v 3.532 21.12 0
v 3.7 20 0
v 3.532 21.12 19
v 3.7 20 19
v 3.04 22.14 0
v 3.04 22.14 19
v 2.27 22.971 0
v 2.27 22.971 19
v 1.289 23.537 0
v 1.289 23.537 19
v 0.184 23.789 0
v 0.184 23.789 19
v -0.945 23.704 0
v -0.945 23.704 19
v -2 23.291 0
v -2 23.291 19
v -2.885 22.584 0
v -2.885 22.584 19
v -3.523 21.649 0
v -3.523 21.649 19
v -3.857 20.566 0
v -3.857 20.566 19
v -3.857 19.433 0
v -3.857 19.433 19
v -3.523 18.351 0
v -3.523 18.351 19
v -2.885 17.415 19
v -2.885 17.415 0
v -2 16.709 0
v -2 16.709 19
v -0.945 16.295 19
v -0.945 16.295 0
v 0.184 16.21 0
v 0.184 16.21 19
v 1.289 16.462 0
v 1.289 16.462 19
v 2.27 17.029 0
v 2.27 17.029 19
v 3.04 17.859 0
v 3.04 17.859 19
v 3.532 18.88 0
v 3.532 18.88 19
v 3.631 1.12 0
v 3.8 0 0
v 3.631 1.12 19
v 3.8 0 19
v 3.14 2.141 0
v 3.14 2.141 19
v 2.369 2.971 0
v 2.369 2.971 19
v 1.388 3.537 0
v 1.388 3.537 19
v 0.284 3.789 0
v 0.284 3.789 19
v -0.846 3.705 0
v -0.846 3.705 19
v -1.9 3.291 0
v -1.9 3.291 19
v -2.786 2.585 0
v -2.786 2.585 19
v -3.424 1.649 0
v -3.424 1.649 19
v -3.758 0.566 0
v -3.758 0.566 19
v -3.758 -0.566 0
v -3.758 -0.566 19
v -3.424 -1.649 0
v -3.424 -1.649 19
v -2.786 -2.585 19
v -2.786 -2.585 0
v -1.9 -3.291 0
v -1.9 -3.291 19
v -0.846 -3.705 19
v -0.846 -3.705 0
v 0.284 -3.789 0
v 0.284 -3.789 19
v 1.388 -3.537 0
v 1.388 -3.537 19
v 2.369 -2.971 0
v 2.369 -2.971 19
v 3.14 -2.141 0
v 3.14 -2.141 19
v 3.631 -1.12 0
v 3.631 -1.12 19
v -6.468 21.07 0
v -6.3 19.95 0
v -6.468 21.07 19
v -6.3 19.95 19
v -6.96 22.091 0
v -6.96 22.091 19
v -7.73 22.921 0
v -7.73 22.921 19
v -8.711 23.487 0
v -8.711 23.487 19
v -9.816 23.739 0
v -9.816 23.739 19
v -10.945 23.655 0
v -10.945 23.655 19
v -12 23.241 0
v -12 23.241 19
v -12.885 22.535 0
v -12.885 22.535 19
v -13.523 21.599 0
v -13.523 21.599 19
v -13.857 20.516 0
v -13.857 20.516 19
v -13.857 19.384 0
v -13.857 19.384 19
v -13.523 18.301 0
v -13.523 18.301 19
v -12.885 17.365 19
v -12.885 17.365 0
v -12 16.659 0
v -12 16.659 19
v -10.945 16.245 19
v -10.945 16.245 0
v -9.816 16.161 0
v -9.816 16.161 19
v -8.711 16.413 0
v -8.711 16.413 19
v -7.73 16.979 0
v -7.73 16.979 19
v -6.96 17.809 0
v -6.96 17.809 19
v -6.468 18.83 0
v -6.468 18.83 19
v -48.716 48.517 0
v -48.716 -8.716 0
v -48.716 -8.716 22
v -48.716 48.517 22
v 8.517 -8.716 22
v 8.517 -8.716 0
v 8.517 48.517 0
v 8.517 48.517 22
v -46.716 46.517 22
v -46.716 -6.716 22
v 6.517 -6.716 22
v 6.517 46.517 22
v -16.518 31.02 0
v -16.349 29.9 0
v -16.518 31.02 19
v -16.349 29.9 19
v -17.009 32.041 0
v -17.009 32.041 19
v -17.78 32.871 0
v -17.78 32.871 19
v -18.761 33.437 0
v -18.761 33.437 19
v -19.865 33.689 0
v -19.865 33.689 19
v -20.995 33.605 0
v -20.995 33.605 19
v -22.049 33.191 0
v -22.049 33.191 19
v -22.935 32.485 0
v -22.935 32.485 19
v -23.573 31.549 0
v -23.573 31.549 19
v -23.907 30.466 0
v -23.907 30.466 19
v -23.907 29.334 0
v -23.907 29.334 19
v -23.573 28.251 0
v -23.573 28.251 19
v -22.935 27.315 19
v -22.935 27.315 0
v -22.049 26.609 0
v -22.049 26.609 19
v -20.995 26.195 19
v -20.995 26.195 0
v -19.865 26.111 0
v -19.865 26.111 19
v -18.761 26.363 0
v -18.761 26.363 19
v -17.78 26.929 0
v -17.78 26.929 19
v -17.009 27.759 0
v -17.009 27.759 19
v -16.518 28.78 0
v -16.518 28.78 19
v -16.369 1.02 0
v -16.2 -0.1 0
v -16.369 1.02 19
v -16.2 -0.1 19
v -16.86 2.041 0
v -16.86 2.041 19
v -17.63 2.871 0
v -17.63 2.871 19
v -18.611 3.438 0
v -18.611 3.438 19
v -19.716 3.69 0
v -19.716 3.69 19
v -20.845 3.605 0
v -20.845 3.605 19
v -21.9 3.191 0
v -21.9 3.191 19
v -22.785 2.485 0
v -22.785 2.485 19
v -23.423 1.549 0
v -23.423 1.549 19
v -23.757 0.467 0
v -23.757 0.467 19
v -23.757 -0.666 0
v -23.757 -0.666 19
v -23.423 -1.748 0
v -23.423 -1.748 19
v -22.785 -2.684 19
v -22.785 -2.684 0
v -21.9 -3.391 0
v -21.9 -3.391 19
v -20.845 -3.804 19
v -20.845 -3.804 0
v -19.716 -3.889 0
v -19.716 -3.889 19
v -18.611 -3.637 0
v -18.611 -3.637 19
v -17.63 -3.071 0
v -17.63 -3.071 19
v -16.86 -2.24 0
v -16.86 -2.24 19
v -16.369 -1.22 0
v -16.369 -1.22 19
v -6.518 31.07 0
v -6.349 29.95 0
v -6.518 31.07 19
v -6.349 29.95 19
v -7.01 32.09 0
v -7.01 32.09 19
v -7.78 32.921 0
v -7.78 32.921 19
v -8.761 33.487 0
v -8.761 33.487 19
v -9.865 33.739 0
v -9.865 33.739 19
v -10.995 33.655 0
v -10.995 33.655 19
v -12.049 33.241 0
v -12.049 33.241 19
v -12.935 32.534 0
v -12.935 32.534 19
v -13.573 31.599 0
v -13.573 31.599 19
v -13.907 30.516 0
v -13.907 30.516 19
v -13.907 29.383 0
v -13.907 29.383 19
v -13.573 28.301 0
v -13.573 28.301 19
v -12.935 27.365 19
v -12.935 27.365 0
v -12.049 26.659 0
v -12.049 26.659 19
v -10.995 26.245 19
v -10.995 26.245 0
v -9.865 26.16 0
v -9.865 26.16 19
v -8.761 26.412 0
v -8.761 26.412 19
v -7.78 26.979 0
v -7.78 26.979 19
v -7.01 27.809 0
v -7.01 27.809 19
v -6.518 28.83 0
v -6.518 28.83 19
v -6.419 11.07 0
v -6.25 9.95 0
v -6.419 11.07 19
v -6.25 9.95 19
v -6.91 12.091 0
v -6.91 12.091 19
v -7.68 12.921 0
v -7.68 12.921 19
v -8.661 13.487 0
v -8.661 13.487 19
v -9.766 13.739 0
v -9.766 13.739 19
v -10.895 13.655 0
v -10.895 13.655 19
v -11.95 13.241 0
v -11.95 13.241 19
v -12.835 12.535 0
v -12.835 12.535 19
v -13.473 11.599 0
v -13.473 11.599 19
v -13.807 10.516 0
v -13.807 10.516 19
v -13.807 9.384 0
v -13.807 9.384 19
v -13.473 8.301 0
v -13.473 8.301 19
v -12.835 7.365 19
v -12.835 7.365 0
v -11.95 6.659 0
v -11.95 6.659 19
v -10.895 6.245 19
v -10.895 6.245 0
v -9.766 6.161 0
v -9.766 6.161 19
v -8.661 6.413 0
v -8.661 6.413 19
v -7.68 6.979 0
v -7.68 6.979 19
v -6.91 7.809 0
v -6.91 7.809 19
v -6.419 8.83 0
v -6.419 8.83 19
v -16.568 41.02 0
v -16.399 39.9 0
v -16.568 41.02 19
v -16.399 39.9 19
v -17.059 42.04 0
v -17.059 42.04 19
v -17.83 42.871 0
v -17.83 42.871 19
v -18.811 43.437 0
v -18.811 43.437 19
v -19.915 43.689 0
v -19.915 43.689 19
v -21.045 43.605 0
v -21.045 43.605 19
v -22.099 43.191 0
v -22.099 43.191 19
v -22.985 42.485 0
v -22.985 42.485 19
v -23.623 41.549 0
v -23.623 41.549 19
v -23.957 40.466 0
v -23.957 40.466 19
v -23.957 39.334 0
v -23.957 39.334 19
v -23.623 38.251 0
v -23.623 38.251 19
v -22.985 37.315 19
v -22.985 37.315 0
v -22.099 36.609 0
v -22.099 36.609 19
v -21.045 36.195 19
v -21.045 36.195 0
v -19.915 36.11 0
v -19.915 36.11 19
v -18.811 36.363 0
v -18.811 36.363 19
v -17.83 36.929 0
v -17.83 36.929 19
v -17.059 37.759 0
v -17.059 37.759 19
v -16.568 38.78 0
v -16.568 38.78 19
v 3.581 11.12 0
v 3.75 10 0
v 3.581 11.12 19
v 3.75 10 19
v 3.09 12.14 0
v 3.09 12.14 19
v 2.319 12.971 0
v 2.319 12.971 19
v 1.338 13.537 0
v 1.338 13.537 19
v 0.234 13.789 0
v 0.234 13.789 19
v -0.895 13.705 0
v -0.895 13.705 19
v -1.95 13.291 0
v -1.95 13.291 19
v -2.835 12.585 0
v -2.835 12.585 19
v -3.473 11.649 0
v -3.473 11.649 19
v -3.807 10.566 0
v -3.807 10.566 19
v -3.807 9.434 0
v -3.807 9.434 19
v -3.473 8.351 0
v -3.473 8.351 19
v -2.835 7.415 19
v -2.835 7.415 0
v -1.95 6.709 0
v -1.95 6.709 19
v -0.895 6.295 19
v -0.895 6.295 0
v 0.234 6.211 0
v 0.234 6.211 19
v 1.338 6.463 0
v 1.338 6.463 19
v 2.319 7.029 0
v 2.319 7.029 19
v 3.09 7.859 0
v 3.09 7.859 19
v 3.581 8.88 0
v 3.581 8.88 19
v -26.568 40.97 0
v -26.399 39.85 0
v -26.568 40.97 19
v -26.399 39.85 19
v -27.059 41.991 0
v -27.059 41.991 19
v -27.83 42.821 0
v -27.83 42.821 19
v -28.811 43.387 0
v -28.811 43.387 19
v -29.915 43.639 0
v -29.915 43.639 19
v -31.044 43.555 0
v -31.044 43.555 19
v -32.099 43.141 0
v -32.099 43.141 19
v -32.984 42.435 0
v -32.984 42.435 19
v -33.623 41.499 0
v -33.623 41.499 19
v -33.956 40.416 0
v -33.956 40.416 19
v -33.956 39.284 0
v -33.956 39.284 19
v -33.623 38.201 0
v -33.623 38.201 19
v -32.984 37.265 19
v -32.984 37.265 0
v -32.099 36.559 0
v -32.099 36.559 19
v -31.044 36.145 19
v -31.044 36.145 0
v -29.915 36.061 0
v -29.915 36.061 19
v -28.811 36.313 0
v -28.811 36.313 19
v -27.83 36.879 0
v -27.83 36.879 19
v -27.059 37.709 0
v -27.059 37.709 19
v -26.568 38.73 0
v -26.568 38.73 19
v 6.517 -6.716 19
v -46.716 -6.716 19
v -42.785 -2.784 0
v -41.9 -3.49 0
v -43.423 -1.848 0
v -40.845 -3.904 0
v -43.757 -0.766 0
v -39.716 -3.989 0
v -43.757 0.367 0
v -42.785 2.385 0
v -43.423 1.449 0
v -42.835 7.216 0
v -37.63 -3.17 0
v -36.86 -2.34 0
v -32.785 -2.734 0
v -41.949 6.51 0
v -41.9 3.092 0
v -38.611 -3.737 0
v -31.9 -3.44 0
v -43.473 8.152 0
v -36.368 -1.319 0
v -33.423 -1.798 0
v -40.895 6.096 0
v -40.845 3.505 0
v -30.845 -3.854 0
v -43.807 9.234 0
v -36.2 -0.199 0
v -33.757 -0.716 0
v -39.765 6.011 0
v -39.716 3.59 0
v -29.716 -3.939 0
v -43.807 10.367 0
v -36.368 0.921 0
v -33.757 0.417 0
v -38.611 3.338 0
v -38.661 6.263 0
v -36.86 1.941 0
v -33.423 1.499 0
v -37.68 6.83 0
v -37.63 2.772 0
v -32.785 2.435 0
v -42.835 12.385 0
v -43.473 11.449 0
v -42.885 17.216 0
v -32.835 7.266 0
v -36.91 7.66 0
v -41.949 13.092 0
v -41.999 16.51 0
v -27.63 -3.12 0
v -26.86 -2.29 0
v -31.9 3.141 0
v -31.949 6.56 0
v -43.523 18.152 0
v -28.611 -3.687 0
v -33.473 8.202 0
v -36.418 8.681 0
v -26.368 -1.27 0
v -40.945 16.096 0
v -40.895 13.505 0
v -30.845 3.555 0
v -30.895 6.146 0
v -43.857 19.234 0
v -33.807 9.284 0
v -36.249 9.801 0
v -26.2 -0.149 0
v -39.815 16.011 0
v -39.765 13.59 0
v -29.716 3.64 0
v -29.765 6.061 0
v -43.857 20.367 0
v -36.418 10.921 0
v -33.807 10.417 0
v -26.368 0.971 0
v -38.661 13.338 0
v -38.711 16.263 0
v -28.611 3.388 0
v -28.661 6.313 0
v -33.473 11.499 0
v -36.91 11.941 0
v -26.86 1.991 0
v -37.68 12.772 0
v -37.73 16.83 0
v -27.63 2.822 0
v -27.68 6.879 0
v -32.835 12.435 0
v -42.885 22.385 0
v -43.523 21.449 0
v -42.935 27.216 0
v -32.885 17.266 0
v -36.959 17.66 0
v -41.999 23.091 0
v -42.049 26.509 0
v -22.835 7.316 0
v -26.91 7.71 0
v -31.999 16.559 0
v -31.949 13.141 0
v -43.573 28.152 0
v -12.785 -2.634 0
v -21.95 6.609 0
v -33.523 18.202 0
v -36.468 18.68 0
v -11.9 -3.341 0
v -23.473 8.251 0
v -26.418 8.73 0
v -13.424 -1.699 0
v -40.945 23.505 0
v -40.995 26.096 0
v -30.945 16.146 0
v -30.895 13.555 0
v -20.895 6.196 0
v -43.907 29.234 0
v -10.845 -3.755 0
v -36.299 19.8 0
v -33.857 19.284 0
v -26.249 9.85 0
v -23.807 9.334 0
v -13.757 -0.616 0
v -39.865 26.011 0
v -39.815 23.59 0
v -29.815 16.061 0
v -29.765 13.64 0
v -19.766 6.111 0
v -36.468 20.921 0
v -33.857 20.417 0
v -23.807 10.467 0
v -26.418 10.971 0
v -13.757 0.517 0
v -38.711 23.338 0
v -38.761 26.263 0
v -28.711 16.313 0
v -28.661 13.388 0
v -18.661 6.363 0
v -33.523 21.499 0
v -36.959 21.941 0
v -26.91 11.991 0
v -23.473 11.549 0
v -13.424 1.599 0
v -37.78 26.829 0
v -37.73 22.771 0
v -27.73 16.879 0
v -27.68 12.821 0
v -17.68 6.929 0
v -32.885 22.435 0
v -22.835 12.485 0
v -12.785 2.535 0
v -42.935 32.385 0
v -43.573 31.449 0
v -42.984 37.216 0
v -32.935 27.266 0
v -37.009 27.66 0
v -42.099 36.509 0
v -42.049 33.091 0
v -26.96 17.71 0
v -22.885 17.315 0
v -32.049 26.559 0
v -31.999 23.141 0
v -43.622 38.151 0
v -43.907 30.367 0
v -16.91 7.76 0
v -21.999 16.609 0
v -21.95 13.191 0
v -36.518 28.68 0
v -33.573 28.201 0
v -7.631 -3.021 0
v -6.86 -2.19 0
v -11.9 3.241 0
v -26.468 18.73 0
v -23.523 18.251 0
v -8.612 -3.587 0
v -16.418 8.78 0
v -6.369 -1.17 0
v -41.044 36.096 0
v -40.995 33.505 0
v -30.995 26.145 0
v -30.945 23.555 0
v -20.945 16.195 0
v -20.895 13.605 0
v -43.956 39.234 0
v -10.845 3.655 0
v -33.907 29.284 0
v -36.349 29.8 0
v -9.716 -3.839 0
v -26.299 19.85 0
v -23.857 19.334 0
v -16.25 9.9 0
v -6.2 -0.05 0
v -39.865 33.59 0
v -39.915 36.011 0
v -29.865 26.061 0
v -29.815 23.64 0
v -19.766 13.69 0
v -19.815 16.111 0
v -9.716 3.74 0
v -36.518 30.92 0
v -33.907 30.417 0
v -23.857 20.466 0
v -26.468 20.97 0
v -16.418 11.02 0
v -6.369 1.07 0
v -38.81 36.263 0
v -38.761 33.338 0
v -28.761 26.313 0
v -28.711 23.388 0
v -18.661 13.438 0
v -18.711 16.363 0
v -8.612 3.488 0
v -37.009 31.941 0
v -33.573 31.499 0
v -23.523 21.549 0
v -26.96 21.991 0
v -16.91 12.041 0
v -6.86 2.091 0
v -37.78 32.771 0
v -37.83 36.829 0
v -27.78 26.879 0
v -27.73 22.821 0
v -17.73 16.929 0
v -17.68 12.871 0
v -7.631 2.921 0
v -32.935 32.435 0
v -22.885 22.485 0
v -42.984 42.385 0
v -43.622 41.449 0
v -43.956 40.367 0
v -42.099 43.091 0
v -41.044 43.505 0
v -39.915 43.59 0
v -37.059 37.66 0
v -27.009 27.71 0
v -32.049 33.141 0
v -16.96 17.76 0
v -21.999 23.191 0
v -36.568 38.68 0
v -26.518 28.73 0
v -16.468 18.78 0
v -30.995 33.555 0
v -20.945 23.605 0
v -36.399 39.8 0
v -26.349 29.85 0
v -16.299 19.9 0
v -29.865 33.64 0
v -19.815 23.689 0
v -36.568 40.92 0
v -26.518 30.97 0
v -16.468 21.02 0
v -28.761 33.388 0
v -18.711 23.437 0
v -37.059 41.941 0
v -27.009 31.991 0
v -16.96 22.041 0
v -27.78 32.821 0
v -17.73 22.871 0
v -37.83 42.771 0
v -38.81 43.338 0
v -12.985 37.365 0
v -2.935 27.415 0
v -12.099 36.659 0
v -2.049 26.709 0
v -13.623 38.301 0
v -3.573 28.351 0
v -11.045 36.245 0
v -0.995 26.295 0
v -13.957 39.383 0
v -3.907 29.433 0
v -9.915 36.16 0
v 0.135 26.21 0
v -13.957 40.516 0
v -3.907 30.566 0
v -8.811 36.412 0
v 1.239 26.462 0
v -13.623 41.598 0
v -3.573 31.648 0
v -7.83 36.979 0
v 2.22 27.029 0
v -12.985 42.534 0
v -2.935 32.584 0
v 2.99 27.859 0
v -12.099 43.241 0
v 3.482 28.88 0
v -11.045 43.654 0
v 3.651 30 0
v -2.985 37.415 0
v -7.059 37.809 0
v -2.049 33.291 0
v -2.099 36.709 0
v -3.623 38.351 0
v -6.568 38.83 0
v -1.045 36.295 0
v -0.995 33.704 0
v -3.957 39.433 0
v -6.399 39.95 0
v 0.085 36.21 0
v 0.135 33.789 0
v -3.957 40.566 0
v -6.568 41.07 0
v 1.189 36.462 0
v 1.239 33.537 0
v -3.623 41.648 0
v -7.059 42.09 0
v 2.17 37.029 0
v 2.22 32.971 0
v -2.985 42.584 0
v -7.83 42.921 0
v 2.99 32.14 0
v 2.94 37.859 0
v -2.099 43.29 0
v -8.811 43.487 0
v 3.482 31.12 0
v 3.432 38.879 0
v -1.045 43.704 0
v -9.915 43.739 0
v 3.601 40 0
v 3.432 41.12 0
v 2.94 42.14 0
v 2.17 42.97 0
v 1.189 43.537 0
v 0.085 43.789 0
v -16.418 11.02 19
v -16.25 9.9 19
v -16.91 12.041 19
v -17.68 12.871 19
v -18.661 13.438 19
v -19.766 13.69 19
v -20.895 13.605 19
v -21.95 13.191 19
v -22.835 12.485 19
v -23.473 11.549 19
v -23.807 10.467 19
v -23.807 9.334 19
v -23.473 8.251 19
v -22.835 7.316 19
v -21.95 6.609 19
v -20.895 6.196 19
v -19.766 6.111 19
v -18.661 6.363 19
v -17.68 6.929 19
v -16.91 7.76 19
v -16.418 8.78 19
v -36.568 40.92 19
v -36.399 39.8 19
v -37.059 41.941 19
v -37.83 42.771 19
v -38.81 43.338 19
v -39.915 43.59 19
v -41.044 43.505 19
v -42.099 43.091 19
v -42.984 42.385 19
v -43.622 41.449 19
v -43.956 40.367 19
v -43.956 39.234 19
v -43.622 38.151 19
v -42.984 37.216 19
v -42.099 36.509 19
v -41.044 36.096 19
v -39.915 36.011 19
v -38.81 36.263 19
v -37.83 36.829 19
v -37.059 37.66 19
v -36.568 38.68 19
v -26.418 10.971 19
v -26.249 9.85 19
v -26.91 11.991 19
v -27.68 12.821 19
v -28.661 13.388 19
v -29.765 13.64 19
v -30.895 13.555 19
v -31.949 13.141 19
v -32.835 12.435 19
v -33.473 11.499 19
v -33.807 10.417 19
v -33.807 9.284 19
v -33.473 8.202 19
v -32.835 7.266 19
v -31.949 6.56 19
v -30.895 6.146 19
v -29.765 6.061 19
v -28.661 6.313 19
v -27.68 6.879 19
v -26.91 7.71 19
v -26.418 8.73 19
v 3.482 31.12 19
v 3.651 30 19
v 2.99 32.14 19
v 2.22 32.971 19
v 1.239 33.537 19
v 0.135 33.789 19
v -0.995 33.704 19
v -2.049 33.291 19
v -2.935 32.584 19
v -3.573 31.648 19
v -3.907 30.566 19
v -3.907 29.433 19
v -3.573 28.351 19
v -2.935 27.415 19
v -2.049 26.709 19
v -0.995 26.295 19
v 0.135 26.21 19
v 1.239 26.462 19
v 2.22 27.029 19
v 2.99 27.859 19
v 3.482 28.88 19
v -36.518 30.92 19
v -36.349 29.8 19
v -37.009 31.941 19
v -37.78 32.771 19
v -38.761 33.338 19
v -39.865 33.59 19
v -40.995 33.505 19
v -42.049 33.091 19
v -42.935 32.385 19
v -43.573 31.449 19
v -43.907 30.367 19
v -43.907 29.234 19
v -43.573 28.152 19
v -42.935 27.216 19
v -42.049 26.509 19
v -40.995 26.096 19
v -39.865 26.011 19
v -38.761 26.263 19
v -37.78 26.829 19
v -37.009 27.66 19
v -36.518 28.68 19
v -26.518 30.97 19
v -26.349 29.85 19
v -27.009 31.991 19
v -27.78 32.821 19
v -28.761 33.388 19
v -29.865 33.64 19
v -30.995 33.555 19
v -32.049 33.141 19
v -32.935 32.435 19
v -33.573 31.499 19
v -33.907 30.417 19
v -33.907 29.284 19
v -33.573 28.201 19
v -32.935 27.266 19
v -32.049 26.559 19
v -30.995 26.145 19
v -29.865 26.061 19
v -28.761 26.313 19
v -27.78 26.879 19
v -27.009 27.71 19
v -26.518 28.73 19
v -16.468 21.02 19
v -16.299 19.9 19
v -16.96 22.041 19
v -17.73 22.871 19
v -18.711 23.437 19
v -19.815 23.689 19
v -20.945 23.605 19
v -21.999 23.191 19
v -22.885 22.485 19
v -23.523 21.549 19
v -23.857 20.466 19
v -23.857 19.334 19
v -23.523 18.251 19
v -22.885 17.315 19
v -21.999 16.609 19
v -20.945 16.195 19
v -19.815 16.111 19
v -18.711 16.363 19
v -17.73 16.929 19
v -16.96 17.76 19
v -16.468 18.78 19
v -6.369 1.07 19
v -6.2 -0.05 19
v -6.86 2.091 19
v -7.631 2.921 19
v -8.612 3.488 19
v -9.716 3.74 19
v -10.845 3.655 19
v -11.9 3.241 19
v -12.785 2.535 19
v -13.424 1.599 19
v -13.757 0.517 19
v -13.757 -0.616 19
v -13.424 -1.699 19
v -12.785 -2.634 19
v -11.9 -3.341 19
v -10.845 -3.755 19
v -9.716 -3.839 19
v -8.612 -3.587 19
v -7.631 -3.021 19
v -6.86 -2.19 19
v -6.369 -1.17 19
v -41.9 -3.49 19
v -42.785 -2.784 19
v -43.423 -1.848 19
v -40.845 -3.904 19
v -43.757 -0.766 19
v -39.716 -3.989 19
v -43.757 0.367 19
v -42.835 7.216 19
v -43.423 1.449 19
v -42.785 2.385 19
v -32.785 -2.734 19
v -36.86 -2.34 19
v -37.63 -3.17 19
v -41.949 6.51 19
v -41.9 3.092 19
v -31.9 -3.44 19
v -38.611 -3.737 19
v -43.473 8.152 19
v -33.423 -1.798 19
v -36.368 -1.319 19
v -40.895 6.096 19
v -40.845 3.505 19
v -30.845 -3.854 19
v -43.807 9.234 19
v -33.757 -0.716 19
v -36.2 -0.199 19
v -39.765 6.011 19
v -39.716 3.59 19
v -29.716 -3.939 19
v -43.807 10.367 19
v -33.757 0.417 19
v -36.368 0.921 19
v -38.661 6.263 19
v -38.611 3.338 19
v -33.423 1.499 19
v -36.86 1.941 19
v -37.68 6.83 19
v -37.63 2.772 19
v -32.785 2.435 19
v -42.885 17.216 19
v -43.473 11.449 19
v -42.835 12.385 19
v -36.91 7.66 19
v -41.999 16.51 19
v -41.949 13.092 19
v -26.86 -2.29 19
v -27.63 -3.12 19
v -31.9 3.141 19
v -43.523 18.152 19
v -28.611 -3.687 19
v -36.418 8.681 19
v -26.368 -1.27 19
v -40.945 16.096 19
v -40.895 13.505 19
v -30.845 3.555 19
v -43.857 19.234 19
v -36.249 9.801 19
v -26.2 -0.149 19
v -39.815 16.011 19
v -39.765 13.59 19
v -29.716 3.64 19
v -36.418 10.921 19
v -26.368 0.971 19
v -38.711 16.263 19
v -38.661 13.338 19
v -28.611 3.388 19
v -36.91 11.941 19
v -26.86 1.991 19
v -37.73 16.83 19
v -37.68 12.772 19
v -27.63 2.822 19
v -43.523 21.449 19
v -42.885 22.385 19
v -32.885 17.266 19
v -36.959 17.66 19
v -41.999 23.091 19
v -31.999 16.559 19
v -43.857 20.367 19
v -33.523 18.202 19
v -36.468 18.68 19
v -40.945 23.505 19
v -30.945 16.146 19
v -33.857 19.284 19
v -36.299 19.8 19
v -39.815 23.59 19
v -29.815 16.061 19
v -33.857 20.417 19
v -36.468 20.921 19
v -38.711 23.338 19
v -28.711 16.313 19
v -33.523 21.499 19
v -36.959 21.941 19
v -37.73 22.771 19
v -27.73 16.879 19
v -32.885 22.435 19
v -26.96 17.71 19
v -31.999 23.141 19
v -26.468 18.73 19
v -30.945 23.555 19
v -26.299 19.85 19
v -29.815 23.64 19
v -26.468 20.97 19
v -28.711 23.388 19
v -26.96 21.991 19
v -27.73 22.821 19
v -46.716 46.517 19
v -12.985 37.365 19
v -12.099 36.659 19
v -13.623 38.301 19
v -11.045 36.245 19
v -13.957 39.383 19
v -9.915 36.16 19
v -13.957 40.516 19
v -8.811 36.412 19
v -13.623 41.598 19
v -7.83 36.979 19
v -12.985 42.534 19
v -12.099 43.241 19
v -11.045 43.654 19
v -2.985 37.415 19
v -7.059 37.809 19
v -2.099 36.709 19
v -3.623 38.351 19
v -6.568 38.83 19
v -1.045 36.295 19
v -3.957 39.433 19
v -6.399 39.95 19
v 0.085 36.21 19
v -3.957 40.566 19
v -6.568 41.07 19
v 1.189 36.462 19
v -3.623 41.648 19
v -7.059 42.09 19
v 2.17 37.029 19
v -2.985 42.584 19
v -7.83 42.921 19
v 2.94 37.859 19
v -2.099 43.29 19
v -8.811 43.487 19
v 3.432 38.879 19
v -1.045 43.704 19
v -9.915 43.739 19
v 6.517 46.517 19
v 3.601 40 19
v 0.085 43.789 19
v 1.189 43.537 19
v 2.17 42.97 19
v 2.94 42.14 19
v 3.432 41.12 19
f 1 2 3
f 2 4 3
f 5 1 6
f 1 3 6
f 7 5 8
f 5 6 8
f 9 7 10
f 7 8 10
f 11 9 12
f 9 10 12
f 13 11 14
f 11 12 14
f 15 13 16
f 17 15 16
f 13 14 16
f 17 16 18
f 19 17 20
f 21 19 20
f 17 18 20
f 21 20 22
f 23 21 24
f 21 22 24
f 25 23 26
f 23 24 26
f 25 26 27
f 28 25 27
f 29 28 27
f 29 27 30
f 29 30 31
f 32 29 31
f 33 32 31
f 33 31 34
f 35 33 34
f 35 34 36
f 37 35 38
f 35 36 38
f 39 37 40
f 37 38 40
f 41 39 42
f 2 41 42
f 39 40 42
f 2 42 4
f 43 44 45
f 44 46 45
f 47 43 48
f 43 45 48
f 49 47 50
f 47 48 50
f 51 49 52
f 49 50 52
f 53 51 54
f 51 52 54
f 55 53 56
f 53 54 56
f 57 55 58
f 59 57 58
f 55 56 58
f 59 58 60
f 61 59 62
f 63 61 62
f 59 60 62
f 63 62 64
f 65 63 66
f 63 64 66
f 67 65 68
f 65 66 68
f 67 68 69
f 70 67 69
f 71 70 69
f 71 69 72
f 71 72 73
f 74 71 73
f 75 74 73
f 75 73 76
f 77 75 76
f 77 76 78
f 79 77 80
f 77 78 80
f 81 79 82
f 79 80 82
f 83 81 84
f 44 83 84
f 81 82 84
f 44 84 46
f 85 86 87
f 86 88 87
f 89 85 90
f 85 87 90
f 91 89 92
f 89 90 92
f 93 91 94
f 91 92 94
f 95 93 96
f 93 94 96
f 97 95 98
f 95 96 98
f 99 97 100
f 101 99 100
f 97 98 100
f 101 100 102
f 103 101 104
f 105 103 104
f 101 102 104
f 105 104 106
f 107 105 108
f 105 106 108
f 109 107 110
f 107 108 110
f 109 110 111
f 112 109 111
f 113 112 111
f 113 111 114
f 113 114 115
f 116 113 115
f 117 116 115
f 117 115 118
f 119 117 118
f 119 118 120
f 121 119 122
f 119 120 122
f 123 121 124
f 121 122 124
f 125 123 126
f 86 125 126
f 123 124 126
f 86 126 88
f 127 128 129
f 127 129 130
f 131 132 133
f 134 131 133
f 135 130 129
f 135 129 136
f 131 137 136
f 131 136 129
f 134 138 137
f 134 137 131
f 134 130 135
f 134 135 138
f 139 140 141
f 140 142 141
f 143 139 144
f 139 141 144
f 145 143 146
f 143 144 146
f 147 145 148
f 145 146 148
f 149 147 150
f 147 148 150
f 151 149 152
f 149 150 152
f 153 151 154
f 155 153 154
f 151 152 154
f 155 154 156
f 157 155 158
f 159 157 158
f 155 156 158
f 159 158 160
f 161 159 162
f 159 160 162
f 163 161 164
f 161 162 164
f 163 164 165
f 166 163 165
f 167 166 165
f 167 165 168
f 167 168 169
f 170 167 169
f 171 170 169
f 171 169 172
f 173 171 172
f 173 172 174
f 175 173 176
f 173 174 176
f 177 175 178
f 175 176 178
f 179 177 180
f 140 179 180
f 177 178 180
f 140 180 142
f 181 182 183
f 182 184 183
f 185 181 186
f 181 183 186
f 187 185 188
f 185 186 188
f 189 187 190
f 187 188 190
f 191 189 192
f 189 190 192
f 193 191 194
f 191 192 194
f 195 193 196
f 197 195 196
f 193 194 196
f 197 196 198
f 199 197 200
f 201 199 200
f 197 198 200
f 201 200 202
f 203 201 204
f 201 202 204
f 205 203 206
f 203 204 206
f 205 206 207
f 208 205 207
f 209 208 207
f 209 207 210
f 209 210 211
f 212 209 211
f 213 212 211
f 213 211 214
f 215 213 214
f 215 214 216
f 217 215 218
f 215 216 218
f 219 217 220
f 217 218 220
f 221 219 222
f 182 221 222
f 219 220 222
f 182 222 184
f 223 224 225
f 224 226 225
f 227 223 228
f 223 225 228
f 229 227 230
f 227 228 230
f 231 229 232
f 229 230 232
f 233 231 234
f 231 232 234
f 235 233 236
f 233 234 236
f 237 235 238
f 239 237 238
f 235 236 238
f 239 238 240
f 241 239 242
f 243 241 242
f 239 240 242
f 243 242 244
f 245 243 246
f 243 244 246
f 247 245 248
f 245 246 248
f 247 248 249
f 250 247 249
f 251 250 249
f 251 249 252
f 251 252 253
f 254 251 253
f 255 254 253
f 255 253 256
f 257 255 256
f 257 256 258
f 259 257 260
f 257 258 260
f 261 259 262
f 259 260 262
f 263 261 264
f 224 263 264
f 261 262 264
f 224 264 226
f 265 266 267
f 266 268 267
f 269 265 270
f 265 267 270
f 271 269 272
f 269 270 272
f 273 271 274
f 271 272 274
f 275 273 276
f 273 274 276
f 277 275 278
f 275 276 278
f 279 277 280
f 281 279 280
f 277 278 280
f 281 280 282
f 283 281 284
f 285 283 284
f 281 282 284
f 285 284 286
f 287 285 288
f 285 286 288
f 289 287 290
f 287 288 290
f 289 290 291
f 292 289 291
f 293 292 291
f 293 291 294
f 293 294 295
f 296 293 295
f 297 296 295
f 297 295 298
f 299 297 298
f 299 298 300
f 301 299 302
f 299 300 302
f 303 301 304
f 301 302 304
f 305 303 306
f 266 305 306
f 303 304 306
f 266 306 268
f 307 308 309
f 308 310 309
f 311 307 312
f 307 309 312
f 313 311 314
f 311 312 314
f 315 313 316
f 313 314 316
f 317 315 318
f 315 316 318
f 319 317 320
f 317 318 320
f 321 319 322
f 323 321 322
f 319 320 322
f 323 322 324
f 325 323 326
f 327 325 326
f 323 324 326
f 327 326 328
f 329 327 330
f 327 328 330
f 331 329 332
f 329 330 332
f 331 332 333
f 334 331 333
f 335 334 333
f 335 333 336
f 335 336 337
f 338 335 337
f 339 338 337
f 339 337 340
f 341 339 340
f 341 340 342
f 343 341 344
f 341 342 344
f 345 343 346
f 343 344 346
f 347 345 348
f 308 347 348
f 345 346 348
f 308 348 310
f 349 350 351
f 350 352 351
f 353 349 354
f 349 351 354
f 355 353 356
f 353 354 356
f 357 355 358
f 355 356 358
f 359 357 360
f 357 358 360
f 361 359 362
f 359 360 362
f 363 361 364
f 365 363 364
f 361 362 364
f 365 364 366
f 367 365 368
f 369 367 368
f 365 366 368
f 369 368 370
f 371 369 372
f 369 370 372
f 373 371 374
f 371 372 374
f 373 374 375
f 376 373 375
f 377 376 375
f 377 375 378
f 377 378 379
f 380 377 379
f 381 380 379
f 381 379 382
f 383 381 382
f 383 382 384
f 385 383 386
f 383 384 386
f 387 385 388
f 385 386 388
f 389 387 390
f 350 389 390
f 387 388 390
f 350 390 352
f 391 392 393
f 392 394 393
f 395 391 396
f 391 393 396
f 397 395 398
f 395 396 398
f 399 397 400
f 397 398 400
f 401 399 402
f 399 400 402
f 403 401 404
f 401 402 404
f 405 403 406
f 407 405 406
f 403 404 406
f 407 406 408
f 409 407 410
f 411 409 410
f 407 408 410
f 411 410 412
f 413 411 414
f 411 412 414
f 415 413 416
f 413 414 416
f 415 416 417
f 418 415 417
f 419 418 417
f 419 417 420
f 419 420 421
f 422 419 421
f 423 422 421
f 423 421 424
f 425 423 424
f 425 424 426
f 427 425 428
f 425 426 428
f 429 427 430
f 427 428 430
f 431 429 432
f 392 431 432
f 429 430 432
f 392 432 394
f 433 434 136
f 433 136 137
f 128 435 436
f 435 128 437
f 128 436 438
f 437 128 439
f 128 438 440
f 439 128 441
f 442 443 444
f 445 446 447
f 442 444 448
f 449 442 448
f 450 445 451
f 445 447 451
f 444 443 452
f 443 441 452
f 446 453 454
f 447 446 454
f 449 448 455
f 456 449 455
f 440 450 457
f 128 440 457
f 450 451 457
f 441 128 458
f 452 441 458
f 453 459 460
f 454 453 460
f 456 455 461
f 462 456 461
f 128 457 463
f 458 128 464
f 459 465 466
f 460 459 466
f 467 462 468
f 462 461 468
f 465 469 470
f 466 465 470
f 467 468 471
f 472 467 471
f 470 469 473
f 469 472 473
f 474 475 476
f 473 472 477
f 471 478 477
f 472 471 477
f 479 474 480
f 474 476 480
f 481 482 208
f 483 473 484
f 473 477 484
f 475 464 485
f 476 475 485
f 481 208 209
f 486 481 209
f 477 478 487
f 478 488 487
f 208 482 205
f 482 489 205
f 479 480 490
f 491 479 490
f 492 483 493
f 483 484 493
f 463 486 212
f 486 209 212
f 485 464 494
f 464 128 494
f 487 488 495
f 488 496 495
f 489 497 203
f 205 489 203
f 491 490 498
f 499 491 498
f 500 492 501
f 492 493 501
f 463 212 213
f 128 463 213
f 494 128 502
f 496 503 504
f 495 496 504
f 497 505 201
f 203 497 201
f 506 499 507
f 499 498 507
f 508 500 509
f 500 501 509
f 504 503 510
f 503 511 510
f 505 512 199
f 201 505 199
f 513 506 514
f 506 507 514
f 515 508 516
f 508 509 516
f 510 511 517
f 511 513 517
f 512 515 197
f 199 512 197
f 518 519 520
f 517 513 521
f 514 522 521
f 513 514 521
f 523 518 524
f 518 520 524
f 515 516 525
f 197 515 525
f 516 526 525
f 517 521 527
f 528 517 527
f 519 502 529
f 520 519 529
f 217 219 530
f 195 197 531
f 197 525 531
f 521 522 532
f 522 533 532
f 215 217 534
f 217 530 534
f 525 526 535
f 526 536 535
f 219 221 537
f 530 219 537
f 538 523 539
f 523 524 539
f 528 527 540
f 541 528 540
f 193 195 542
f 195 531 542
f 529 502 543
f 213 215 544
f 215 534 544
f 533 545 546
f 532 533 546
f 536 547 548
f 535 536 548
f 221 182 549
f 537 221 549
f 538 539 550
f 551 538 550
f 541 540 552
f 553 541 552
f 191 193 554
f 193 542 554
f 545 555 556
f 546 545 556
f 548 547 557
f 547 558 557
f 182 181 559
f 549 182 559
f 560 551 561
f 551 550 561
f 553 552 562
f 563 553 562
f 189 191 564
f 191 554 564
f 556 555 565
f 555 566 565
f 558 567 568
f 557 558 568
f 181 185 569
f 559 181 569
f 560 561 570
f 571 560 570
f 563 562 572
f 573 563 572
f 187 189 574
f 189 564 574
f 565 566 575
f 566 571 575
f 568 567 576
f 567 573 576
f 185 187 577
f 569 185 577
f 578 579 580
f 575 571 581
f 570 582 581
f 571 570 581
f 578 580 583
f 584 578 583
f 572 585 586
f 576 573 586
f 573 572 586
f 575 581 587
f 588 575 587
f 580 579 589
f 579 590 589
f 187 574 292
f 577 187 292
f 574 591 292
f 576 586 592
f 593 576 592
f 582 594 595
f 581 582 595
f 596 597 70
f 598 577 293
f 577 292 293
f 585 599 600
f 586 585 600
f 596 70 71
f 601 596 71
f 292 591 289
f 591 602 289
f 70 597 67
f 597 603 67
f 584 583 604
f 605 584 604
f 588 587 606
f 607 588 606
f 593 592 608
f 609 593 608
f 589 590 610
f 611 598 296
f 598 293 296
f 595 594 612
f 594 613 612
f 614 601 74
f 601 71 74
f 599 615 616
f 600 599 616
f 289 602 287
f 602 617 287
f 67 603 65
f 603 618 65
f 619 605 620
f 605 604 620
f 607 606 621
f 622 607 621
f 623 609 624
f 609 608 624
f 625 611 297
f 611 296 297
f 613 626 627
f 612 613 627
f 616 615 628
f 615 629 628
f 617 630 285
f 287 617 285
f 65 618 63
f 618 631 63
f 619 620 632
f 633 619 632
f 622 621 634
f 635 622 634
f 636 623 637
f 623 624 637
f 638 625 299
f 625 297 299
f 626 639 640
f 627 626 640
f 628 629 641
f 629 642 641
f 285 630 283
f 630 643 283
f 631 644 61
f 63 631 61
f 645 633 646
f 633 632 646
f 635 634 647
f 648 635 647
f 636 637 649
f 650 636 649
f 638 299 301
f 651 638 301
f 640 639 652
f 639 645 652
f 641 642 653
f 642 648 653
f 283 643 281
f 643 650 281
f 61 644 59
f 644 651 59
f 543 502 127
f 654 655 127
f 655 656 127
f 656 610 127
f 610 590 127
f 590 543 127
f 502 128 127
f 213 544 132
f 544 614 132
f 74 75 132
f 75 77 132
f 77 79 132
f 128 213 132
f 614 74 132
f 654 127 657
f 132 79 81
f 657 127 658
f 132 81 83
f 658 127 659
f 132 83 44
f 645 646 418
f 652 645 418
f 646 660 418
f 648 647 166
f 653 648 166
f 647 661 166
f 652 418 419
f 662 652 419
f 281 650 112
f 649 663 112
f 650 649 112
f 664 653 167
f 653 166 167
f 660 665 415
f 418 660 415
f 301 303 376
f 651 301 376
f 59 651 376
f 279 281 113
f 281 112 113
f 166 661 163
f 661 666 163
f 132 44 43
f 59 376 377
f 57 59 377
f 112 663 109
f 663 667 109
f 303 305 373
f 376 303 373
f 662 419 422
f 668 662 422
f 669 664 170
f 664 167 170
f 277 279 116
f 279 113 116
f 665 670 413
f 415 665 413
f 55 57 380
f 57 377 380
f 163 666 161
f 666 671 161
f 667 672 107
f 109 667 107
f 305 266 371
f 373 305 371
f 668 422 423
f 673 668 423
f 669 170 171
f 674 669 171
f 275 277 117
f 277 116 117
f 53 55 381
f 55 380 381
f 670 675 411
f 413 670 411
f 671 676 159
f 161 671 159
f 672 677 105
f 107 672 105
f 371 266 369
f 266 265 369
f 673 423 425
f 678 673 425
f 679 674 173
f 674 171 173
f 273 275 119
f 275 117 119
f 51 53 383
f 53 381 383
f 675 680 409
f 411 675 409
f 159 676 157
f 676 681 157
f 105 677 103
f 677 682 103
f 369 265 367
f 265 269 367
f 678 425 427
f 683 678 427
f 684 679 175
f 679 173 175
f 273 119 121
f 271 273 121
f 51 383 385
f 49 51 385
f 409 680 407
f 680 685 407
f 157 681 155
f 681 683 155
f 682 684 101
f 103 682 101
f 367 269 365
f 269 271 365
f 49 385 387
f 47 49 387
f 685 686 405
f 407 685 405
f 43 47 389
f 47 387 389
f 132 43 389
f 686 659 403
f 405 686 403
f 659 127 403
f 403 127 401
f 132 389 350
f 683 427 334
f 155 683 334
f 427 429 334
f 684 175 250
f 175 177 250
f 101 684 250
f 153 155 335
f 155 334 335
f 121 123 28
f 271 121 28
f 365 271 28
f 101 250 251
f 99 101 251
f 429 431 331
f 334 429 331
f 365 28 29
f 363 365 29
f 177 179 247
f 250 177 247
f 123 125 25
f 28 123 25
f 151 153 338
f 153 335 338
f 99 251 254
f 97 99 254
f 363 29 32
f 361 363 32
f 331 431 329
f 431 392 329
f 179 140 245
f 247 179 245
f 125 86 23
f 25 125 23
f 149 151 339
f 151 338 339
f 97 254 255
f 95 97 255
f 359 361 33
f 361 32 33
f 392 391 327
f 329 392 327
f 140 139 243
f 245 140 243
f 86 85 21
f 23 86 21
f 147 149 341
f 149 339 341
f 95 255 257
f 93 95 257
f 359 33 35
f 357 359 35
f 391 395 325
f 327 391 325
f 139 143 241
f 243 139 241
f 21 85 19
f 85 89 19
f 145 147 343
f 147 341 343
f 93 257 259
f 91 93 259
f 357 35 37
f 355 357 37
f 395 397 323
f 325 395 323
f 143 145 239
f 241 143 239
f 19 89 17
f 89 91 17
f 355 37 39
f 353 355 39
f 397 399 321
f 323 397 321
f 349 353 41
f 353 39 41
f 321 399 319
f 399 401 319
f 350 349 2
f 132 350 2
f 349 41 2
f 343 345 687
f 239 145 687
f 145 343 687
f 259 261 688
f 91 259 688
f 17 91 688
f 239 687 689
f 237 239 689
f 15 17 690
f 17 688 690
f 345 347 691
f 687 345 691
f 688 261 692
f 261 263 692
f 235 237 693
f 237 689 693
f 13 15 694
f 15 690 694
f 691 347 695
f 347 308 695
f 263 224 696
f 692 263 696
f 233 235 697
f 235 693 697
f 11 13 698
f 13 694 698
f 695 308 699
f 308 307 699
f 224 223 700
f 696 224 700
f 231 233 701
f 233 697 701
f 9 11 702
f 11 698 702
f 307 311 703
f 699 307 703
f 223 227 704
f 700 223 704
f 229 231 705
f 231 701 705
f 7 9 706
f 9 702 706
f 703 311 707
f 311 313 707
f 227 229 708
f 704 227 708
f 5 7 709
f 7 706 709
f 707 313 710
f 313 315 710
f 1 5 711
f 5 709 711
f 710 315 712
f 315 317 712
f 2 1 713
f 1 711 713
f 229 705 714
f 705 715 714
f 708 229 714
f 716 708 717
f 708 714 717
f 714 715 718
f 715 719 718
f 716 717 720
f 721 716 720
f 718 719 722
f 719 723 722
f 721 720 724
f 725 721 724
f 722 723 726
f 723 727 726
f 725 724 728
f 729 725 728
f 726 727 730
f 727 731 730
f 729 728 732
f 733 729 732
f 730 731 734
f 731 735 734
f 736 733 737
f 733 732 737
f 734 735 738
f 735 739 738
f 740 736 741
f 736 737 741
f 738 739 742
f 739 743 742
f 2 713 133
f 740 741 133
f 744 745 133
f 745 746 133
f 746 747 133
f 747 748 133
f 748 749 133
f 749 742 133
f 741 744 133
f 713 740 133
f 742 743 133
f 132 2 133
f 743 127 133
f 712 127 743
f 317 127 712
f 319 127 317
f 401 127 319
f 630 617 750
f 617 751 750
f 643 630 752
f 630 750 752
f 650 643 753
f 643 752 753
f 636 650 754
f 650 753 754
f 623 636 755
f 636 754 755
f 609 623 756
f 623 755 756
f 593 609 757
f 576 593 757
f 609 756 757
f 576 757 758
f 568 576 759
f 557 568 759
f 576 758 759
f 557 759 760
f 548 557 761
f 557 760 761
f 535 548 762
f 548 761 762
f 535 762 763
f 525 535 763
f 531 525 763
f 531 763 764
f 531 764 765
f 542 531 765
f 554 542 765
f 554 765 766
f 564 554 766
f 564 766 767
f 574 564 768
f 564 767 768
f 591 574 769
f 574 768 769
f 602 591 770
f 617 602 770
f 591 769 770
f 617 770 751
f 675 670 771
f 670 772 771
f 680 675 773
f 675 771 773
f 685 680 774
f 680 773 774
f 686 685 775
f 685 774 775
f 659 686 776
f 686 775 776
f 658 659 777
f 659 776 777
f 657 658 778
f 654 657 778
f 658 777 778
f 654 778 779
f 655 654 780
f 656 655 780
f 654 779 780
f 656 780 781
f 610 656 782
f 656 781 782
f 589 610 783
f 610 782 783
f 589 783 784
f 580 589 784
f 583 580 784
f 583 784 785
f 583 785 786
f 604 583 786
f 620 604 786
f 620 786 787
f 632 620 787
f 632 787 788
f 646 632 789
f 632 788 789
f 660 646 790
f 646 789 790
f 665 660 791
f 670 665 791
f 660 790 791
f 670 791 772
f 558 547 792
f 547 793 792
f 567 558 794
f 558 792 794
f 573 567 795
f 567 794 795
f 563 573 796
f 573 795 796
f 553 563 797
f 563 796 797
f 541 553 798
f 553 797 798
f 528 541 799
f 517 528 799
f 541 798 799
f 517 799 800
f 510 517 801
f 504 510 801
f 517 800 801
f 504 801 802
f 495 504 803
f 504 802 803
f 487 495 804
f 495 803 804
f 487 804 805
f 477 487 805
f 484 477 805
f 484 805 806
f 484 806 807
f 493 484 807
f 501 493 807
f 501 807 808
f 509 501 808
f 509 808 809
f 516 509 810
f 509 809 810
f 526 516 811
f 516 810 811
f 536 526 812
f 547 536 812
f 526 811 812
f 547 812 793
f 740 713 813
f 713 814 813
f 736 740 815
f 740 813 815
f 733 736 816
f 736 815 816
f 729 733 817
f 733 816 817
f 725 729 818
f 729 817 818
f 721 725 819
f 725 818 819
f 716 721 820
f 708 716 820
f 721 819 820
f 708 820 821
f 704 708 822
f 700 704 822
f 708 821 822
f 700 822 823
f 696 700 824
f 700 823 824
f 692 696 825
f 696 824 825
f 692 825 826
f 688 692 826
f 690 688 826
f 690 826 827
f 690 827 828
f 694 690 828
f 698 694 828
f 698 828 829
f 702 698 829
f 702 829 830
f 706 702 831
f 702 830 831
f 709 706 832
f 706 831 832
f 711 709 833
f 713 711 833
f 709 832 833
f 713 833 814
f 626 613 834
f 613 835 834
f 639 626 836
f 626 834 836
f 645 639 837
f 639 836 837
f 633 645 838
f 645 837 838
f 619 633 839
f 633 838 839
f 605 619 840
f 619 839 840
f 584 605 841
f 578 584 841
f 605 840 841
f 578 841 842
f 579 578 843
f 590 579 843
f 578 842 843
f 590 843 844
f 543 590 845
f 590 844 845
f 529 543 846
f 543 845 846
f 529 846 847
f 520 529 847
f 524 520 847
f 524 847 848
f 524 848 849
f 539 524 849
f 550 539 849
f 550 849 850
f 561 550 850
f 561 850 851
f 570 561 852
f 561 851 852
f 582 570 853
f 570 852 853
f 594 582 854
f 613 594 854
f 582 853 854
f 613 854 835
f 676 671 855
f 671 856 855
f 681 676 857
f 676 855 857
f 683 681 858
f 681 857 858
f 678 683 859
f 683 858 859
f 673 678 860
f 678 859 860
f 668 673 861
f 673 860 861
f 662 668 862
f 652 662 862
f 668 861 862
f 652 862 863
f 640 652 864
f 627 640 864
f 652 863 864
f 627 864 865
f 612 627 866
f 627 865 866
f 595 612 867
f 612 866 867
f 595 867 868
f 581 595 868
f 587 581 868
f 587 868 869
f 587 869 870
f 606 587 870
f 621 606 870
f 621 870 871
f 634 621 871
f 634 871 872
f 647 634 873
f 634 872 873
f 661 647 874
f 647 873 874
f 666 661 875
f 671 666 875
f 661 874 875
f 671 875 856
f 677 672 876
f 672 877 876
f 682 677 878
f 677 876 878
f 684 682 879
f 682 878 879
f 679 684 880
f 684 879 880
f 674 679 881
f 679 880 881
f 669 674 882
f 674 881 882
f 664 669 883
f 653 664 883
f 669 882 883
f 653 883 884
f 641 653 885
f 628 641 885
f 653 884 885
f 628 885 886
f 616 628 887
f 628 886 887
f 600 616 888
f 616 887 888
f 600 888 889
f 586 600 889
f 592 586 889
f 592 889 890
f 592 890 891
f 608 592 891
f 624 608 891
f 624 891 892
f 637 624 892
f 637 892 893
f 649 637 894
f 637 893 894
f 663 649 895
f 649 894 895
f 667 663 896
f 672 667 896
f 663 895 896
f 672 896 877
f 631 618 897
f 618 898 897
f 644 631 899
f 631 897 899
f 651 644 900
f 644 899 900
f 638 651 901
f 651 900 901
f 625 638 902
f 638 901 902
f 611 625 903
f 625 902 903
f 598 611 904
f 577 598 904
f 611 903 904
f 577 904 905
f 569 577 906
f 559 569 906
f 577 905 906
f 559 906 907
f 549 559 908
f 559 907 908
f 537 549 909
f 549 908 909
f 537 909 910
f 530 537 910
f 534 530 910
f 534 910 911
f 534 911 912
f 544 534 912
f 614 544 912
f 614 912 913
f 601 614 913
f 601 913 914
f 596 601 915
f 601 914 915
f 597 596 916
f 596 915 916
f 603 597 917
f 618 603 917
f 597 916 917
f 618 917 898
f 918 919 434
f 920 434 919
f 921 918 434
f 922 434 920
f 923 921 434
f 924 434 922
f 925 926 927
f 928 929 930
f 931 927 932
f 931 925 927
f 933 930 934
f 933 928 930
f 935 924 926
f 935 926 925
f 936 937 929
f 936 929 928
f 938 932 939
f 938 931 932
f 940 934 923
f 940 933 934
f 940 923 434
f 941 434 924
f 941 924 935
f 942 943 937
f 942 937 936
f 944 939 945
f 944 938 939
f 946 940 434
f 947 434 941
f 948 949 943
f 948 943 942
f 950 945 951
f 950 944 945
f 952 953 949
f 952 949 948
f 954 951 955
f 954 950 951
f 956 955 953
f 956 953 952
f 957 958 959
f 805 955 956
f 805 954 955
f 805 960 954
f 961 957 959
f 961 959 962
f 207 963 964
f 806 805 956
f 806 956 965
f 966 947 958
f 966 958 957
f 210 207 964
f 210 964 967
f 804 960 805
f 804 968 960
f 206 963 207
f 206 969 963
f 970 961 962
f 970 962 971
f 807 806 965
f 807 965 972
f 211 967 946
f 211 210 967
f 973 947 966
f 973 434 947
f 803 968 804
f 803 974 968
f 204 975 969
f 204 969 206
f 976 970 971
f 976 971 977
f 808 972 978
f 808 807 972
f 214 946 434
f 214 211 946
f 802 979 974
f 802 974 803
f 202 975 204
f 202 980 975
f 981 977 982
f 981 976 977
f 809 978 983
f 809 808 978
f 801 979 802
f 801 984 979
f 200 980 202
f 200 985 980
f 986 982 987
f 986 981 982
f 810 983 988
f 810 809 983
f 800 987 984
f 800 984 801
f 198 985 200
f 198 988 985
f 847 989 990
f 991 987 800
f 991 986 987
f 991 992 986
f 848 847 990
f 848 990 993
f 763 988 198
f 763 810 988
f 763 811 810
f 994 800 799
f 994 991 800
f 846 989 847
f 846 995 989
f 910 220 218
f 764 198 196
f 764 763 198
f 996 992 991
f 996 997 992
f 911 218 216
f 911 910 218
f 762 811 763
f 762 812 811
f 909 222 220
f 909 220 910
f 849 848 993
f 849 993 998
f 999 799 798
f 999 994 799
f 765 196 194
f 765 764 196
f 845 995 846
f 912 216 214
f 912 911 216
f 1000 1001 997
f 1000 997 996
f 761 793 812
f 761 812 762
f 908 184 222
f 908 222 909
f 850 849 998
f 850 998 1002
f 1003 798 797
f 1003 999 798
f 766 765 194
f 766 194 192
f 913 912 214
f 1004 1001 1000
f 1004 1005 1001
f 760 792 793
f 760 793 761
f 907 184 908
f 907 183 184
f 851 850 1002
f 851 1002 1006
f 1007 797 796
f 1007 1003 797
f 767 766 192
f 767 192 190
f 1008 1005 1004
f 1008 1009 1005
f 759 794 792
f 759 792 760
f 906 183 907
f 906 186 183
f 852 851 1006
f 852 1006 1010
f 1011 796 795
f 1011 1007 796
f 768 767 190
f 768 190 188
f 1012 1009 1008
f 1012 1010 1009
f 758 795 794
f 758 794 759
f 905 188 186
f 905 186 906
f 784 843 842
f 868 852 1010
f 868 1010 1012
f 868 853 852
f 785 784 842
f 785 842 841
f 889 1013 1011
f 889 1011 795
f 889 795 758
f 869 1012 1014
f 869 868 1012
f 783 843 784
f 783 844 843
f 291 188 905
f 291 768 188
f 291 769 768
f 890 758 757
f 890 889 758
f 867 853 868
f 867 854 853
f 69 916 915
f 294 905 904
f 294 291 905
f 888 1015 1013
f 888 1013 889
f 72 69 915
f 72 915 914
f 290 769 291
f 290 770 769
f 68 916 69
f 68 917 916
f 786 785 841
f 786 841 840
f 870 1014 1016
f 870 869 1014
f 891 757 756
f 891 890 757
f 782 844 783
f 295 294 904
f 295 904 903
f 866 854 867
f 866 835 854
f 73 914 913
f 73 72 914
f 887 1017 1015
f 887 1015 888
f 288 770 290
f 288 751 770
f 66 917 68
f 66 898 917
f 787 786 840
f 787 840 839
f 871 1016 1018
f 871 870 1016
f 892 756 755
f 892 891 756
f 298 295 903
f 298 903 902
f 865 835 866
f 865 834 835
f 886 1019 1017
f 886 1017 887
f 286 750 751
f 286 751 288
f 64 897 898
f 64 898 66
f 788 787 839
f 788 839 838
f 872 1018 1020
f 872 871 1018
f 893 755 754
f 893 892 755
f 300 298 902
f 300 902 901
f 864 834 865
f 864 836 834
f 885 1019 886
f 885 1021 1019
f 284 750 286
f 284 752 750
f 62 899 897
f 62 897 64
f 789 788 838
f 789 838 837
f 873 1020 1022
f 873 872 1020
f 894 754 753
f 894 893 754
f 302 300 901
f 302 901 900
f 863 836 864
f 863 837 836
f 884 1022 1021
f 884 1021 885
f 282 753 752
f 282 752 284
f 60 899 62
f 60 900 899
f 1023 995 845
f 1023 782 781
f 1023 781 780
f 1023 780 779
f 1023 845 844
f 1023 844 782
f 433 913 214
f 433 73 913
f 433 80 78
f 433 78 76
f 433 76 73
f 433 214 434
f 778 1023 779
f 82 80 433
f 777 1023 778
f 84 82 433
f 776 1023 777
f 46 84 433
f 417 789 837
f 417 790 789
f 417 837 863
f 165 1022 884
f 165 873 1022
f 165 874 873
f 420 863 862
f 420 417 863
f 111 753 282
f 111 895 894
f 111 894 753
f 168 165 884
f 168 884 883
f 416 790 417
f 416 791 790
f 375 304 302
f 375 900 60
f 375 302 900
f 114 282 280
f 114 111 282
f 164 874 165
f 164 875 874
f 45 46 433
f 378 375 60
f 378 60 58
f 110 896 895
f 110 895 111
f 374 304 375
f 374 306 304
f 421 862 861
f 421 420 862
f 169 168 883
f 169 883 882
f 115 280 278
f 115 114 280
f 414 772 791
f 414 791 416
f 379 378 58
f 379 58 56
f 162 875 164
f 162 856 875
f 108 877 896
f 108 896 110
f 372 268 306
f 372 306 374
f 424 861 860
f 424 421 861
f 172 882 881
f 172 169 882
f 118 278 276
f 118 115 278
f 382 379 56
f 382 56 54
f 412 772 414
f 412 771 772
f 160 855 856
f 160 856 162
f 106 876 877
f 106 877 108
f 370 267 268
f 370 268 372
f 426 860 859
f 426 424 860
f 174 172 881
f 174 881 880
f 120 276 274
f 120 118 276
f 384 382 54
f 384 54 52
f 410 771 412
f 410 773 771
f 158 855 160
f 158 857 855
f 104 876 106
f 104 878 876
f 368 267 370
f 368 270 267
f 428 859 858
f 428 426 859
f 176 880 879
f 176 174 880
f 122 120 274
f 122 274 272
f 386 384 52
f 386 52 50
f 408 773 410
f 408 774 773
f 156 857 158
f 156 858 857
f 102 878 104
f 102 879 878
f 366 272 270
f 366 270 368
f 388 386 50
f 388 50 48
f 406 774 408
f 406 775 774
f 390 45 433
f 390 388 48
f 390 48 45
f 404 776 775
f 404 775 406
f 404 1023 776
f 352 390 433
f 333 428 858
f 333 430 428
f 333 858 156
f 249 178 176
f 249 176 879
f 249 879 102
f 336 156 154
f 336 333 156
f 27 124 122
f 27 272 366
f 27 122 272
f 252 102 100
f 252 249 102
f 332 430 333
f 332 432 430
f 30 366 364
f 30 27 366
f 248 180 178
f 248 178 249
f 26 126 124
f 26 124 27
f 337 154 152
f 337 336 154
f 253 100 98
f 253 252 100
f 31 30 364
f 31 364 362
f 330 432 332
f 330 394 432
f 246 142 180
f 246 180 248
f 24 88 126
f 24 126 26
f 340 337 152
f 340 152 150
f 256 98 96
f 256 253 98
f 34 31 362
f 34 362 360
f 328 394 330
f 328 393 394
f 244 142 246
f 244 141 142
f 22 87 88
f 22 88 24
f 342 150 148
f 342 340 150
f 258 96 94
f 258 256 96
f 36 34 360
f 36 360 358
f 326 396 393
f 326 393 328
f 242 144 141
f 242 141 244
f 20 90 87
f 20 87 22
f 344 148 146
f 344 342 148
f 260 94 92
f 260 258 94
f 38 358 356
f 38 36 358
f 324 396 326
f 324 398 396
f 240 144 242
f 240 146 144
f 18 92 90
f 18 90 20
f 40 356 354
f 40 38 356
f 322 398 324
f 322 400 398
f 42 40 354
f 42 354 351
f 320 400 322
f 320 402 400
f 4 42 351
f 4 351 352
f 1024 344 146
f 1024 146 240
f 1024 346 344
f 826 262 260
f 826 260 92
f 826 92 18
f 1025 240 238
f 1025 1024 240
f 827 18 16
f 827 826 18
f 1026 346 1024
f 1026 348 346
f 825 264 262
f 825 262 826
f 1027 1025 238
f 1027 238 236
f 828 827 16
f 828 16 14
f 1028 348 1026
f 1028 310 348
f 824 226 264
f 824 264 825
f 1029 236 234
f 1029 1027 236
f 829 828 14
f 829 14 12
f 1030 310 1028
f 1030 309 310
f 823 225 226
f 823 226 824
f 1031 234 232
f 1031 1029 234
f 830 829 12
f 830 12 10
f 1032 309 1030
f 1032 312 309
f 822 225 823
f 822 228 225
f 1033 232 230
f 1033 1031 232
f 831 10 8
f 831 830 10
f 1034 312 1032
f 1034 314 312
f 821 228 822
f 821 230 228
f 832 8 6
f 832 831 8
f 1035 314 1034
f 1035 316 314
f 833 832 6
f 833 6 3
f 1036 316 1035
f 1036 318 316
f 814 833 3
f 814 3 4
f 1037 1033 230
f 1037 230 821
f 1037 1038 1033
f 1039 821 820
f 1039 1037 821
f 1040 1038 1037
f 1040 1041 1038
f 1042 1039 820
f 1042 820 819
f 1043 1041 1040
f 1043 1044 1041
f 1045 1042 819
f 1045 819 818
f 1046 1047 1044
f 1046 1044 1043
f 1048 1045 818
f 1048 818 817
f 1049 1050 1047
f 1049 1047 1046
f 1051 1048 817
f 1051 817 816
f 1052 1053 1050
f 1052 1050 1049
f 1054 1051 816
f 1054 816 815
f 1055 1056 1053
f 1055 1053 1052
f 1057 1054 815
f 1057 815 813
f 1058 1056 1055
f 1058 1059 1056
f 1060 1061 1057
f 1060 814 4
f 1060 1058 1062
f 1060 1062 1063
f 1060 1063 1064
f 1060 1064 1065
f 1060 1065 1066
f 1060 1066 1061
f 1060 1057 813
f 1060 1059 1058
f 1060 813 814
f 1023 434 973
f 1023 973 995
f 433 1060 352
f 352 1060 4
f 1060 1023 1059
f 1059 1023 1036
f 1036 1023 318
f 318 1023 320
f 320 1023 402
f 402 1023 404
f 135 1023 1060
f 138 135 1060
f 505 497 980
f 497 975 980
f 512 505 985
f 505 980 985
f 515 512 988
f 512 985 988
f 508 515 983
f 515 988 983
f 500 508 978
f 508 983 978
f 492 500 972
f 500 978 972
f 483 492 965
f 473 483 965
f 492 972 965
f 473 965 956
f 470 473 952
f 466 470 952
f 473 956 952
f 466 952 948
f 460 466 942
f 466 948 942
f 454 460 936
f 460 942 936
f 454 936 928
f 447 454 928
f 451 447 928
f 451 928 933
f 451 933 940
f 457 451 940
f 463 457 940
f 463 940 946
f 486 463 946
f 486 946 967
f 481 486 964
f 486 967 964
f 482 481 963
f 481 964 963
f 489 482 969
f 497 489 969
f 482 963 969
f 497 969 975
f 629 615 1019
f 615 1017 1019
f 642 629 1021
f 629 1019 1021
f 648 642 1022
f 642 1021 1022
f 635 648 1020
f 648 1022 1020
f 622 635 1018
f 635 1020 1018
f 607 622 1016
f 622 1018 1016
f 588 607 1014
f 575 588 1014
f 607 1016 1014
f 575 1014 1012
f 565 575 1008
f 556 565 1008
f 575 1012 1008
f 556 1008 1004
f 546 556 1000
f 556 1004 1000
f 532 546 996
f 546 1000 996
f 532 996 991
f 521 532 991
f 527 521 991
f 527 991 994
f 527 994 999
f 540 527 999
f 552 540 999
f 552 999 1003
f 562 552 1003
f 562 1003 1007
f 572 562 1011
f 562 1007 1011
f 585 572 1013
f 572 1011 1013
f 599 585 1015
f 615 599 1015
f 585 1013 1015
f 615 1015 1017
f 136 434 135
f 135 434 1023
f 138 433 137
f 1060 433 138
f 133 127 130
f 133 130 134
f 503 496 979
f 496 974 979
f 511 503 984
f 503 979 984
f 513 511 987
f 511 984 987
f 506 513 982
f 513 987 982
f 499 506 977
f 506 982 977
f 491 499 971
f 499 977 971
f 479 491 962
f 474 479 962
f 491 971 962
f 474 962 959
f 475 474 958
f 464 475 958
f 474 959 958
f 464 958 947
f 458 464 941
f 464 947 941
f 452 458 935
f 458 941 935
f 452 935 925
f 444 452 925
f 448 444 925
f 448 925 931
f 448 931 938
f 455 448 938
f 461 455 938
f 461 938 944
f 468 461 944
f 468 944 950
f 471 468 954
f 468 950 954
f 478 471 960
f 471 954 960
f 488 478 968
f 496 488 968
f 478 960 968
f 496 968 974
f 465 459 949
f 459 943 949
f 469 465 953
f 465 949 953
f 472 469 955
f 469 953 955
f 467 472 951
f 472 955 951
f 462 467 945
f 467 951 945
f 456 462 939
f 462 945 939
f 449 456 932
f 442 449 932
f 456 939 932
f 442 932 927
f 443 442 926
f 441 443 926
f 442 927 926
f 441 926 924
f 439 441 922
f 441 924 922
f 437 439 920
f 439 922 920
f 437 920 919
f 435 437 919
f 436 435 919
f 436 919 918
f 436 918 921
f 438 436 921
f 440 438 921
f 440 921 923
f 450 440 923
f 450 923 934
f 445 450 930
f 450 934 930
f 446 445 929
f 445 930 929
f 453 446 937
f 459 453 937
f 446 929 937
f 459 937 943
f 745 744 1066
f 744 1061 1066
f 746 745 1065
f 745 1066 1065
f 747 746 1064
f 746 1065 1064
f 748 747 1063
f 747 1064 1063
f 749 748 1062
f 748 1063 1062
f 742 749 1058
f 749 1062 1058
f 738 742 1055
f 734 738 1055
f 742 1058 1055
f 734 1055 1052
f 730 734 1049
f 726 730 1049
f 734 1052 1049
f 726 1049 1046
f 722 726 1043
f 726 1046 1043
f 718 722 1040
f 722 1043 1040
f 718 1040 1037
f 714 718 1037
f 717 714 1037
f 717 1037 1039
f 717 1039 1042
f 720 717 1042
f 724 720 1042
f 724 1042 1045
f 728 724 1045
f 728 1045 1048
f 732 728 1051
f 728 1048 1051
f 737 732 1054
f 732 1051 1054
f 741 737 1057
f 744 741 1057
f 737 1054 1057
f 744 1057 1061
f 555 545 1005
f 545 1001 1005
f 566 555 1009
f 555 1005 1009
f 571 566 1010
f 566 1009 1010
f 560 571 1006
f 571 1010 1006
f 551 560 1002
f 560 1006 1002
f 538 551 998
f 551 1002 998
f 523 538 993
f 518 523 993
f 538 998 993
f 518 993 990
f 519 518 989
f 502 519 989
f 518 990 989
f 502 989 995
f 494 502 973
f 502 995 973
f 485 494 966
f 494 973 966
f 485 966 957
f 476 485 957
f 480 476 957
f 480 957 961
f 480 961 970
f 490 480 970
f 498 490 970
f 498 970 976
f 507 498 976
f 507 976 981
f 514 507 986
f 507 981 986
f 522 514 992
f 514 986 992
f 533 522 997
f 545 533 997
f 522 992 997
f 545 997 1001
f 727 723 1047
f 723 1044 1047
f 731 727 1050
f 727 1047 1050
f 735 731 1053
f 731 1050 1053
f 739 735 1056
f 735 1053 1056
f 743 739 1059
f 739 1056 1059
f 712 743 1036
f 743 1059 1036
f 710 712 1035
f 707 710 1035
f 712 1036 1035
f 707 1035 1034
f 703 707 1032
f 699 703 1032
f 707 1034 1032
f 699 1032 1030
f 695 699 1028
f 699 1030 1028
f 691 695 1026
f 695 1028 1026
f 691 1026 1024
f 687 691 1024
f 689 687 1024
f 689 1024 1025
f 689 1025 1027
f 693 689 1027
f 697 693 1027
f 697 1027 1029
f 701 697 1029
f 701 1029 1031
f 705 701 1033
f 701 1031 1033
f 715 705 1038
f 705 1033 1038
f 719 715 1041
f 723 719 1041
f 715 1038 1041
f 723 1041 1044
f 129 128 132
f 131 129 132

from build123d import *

# Parameters (mm, degrees)
SKETCH_W          = 53.23309
SKETCH_H          = 53.233089
PAD_DEPTH         = 19
SKETCH001_R       = 3.8
POCKET_DEPTH      = 2.001
POCKET_DEPTH_BACK = -17.001
SKETCH002_W       = 57.23309
SKETCH002_H       = 57.233089
SKETCH002_W_2     = 53.23309
SKETCH002_H_2     = 53.233089
PAD001_DEPTH      = 22


with BuildPart() as part:
    # Sketch → Pad (new body)
    with BuildSketch(Plane.XY):
        with Locations((-20.099382, 19.900122)):
            Rectangle(SKETCH_W, SKETCH_H)
    extrude(amount=PAD_DEPTH)

    # Sketch001 (on Sketch) → Pocket (cut, two sides)
    with BuildSketch(Plane.XY.offset(2)) as pocket_sk:
        Circle(SKETCH001_R)
        with Locations((-9.999876, -0.049815)):
            Circle(SKETCH001_R)
        with Locations((-19.999752, -0.09963)):
            Circle(SKETCH001_R)
        with Locations((-29.999628, -0.149445)):
            Circle(SKETCH001_R)
        with Locations((-39.999504, -0.19926)):
            Circle(SKETCH001_R)
        with Locations((-0.049815, 9.999876)):
            Circle(SKETCH001_R)
        with Locations((-10.049691, 9.950061)):
            Circle(SKETCH001_R)
        with Locations((-20.049567, 9.900246)):
            Circle(SKETCH001_R)
        with Locations((-30.049443, 9.850431)):
            Circle(SKETCH001_R)
        with Locations((-40.049319, 9.800616)):
            Circle(SKETCH001_R)
        with Locations((-0.09963, 19.999752)):
            Circle(SKETCH001_R)
        with Locations((-10.099506, 19.949937)):
            Circle(SKETCH001_R)
        with Locations((-20.099382, 19.900122)):
            Circle(SKETCH001_R)
        with Locations((-30.099258, 19.850307)):
            Circle(SKETCH001_R)
        with Locations((-40.099134, 19.800492)):
            Circle(SKETCH001_R)
        with Locations((-0.149445, 29.999628)):
            Circle(SKETCH001_R)
        with Locations((-10.149321, 29.949813)):
            Circle(SKETCH001_R)
        with Locations((-20.149197, 29.899998)):
            Circle(SKETCH001_R)
        with Locations((-30.149073, 29.850183)):
            Circle(SKETCH001_R)
        with Locations((-40.148949, 29.800368)):
            Circle(SKETCH001_R)
        with Locations((-0.19926, 39.999504)):
            Circle(SKETCH001_R)
        with Locations((-10.199136, 39.949689)):
            Circle(SKETCH001_R)
        with Locations((-20.199012, 39.899874)):
            Circle(SKETCH001_R)
        with Locations((-30.198888, 39.850059)):
            Circle(SKETCH001_R)
        with Locations((-40.198764, 39.800244)):
            Circle(SKETCH001_R)
    extrude(amount=-POCKET_DEPTH, mode=Mode.SUBTRACT)
    extrude(pocket_sk.sketch, amount=-POCKET_DEPTH_BACK, mode=Mode.SUBTRACT)

    # Sketch002 → Pad001 (join)
    with BuildSketch(Plane.XY):
        with Locations((-20.099382, 19.900122)):
            Rectangle(SKETCH002_W, SKETCH002_H)
        with Locations((-20.099382, 19.900122)):
            Rectangle(SKETCH002_W_2, SKETCH002_H_2, mode=Mode.SUBTRACT)
    extrude(amount=PAD001_DEPTH)


solid = part.part
